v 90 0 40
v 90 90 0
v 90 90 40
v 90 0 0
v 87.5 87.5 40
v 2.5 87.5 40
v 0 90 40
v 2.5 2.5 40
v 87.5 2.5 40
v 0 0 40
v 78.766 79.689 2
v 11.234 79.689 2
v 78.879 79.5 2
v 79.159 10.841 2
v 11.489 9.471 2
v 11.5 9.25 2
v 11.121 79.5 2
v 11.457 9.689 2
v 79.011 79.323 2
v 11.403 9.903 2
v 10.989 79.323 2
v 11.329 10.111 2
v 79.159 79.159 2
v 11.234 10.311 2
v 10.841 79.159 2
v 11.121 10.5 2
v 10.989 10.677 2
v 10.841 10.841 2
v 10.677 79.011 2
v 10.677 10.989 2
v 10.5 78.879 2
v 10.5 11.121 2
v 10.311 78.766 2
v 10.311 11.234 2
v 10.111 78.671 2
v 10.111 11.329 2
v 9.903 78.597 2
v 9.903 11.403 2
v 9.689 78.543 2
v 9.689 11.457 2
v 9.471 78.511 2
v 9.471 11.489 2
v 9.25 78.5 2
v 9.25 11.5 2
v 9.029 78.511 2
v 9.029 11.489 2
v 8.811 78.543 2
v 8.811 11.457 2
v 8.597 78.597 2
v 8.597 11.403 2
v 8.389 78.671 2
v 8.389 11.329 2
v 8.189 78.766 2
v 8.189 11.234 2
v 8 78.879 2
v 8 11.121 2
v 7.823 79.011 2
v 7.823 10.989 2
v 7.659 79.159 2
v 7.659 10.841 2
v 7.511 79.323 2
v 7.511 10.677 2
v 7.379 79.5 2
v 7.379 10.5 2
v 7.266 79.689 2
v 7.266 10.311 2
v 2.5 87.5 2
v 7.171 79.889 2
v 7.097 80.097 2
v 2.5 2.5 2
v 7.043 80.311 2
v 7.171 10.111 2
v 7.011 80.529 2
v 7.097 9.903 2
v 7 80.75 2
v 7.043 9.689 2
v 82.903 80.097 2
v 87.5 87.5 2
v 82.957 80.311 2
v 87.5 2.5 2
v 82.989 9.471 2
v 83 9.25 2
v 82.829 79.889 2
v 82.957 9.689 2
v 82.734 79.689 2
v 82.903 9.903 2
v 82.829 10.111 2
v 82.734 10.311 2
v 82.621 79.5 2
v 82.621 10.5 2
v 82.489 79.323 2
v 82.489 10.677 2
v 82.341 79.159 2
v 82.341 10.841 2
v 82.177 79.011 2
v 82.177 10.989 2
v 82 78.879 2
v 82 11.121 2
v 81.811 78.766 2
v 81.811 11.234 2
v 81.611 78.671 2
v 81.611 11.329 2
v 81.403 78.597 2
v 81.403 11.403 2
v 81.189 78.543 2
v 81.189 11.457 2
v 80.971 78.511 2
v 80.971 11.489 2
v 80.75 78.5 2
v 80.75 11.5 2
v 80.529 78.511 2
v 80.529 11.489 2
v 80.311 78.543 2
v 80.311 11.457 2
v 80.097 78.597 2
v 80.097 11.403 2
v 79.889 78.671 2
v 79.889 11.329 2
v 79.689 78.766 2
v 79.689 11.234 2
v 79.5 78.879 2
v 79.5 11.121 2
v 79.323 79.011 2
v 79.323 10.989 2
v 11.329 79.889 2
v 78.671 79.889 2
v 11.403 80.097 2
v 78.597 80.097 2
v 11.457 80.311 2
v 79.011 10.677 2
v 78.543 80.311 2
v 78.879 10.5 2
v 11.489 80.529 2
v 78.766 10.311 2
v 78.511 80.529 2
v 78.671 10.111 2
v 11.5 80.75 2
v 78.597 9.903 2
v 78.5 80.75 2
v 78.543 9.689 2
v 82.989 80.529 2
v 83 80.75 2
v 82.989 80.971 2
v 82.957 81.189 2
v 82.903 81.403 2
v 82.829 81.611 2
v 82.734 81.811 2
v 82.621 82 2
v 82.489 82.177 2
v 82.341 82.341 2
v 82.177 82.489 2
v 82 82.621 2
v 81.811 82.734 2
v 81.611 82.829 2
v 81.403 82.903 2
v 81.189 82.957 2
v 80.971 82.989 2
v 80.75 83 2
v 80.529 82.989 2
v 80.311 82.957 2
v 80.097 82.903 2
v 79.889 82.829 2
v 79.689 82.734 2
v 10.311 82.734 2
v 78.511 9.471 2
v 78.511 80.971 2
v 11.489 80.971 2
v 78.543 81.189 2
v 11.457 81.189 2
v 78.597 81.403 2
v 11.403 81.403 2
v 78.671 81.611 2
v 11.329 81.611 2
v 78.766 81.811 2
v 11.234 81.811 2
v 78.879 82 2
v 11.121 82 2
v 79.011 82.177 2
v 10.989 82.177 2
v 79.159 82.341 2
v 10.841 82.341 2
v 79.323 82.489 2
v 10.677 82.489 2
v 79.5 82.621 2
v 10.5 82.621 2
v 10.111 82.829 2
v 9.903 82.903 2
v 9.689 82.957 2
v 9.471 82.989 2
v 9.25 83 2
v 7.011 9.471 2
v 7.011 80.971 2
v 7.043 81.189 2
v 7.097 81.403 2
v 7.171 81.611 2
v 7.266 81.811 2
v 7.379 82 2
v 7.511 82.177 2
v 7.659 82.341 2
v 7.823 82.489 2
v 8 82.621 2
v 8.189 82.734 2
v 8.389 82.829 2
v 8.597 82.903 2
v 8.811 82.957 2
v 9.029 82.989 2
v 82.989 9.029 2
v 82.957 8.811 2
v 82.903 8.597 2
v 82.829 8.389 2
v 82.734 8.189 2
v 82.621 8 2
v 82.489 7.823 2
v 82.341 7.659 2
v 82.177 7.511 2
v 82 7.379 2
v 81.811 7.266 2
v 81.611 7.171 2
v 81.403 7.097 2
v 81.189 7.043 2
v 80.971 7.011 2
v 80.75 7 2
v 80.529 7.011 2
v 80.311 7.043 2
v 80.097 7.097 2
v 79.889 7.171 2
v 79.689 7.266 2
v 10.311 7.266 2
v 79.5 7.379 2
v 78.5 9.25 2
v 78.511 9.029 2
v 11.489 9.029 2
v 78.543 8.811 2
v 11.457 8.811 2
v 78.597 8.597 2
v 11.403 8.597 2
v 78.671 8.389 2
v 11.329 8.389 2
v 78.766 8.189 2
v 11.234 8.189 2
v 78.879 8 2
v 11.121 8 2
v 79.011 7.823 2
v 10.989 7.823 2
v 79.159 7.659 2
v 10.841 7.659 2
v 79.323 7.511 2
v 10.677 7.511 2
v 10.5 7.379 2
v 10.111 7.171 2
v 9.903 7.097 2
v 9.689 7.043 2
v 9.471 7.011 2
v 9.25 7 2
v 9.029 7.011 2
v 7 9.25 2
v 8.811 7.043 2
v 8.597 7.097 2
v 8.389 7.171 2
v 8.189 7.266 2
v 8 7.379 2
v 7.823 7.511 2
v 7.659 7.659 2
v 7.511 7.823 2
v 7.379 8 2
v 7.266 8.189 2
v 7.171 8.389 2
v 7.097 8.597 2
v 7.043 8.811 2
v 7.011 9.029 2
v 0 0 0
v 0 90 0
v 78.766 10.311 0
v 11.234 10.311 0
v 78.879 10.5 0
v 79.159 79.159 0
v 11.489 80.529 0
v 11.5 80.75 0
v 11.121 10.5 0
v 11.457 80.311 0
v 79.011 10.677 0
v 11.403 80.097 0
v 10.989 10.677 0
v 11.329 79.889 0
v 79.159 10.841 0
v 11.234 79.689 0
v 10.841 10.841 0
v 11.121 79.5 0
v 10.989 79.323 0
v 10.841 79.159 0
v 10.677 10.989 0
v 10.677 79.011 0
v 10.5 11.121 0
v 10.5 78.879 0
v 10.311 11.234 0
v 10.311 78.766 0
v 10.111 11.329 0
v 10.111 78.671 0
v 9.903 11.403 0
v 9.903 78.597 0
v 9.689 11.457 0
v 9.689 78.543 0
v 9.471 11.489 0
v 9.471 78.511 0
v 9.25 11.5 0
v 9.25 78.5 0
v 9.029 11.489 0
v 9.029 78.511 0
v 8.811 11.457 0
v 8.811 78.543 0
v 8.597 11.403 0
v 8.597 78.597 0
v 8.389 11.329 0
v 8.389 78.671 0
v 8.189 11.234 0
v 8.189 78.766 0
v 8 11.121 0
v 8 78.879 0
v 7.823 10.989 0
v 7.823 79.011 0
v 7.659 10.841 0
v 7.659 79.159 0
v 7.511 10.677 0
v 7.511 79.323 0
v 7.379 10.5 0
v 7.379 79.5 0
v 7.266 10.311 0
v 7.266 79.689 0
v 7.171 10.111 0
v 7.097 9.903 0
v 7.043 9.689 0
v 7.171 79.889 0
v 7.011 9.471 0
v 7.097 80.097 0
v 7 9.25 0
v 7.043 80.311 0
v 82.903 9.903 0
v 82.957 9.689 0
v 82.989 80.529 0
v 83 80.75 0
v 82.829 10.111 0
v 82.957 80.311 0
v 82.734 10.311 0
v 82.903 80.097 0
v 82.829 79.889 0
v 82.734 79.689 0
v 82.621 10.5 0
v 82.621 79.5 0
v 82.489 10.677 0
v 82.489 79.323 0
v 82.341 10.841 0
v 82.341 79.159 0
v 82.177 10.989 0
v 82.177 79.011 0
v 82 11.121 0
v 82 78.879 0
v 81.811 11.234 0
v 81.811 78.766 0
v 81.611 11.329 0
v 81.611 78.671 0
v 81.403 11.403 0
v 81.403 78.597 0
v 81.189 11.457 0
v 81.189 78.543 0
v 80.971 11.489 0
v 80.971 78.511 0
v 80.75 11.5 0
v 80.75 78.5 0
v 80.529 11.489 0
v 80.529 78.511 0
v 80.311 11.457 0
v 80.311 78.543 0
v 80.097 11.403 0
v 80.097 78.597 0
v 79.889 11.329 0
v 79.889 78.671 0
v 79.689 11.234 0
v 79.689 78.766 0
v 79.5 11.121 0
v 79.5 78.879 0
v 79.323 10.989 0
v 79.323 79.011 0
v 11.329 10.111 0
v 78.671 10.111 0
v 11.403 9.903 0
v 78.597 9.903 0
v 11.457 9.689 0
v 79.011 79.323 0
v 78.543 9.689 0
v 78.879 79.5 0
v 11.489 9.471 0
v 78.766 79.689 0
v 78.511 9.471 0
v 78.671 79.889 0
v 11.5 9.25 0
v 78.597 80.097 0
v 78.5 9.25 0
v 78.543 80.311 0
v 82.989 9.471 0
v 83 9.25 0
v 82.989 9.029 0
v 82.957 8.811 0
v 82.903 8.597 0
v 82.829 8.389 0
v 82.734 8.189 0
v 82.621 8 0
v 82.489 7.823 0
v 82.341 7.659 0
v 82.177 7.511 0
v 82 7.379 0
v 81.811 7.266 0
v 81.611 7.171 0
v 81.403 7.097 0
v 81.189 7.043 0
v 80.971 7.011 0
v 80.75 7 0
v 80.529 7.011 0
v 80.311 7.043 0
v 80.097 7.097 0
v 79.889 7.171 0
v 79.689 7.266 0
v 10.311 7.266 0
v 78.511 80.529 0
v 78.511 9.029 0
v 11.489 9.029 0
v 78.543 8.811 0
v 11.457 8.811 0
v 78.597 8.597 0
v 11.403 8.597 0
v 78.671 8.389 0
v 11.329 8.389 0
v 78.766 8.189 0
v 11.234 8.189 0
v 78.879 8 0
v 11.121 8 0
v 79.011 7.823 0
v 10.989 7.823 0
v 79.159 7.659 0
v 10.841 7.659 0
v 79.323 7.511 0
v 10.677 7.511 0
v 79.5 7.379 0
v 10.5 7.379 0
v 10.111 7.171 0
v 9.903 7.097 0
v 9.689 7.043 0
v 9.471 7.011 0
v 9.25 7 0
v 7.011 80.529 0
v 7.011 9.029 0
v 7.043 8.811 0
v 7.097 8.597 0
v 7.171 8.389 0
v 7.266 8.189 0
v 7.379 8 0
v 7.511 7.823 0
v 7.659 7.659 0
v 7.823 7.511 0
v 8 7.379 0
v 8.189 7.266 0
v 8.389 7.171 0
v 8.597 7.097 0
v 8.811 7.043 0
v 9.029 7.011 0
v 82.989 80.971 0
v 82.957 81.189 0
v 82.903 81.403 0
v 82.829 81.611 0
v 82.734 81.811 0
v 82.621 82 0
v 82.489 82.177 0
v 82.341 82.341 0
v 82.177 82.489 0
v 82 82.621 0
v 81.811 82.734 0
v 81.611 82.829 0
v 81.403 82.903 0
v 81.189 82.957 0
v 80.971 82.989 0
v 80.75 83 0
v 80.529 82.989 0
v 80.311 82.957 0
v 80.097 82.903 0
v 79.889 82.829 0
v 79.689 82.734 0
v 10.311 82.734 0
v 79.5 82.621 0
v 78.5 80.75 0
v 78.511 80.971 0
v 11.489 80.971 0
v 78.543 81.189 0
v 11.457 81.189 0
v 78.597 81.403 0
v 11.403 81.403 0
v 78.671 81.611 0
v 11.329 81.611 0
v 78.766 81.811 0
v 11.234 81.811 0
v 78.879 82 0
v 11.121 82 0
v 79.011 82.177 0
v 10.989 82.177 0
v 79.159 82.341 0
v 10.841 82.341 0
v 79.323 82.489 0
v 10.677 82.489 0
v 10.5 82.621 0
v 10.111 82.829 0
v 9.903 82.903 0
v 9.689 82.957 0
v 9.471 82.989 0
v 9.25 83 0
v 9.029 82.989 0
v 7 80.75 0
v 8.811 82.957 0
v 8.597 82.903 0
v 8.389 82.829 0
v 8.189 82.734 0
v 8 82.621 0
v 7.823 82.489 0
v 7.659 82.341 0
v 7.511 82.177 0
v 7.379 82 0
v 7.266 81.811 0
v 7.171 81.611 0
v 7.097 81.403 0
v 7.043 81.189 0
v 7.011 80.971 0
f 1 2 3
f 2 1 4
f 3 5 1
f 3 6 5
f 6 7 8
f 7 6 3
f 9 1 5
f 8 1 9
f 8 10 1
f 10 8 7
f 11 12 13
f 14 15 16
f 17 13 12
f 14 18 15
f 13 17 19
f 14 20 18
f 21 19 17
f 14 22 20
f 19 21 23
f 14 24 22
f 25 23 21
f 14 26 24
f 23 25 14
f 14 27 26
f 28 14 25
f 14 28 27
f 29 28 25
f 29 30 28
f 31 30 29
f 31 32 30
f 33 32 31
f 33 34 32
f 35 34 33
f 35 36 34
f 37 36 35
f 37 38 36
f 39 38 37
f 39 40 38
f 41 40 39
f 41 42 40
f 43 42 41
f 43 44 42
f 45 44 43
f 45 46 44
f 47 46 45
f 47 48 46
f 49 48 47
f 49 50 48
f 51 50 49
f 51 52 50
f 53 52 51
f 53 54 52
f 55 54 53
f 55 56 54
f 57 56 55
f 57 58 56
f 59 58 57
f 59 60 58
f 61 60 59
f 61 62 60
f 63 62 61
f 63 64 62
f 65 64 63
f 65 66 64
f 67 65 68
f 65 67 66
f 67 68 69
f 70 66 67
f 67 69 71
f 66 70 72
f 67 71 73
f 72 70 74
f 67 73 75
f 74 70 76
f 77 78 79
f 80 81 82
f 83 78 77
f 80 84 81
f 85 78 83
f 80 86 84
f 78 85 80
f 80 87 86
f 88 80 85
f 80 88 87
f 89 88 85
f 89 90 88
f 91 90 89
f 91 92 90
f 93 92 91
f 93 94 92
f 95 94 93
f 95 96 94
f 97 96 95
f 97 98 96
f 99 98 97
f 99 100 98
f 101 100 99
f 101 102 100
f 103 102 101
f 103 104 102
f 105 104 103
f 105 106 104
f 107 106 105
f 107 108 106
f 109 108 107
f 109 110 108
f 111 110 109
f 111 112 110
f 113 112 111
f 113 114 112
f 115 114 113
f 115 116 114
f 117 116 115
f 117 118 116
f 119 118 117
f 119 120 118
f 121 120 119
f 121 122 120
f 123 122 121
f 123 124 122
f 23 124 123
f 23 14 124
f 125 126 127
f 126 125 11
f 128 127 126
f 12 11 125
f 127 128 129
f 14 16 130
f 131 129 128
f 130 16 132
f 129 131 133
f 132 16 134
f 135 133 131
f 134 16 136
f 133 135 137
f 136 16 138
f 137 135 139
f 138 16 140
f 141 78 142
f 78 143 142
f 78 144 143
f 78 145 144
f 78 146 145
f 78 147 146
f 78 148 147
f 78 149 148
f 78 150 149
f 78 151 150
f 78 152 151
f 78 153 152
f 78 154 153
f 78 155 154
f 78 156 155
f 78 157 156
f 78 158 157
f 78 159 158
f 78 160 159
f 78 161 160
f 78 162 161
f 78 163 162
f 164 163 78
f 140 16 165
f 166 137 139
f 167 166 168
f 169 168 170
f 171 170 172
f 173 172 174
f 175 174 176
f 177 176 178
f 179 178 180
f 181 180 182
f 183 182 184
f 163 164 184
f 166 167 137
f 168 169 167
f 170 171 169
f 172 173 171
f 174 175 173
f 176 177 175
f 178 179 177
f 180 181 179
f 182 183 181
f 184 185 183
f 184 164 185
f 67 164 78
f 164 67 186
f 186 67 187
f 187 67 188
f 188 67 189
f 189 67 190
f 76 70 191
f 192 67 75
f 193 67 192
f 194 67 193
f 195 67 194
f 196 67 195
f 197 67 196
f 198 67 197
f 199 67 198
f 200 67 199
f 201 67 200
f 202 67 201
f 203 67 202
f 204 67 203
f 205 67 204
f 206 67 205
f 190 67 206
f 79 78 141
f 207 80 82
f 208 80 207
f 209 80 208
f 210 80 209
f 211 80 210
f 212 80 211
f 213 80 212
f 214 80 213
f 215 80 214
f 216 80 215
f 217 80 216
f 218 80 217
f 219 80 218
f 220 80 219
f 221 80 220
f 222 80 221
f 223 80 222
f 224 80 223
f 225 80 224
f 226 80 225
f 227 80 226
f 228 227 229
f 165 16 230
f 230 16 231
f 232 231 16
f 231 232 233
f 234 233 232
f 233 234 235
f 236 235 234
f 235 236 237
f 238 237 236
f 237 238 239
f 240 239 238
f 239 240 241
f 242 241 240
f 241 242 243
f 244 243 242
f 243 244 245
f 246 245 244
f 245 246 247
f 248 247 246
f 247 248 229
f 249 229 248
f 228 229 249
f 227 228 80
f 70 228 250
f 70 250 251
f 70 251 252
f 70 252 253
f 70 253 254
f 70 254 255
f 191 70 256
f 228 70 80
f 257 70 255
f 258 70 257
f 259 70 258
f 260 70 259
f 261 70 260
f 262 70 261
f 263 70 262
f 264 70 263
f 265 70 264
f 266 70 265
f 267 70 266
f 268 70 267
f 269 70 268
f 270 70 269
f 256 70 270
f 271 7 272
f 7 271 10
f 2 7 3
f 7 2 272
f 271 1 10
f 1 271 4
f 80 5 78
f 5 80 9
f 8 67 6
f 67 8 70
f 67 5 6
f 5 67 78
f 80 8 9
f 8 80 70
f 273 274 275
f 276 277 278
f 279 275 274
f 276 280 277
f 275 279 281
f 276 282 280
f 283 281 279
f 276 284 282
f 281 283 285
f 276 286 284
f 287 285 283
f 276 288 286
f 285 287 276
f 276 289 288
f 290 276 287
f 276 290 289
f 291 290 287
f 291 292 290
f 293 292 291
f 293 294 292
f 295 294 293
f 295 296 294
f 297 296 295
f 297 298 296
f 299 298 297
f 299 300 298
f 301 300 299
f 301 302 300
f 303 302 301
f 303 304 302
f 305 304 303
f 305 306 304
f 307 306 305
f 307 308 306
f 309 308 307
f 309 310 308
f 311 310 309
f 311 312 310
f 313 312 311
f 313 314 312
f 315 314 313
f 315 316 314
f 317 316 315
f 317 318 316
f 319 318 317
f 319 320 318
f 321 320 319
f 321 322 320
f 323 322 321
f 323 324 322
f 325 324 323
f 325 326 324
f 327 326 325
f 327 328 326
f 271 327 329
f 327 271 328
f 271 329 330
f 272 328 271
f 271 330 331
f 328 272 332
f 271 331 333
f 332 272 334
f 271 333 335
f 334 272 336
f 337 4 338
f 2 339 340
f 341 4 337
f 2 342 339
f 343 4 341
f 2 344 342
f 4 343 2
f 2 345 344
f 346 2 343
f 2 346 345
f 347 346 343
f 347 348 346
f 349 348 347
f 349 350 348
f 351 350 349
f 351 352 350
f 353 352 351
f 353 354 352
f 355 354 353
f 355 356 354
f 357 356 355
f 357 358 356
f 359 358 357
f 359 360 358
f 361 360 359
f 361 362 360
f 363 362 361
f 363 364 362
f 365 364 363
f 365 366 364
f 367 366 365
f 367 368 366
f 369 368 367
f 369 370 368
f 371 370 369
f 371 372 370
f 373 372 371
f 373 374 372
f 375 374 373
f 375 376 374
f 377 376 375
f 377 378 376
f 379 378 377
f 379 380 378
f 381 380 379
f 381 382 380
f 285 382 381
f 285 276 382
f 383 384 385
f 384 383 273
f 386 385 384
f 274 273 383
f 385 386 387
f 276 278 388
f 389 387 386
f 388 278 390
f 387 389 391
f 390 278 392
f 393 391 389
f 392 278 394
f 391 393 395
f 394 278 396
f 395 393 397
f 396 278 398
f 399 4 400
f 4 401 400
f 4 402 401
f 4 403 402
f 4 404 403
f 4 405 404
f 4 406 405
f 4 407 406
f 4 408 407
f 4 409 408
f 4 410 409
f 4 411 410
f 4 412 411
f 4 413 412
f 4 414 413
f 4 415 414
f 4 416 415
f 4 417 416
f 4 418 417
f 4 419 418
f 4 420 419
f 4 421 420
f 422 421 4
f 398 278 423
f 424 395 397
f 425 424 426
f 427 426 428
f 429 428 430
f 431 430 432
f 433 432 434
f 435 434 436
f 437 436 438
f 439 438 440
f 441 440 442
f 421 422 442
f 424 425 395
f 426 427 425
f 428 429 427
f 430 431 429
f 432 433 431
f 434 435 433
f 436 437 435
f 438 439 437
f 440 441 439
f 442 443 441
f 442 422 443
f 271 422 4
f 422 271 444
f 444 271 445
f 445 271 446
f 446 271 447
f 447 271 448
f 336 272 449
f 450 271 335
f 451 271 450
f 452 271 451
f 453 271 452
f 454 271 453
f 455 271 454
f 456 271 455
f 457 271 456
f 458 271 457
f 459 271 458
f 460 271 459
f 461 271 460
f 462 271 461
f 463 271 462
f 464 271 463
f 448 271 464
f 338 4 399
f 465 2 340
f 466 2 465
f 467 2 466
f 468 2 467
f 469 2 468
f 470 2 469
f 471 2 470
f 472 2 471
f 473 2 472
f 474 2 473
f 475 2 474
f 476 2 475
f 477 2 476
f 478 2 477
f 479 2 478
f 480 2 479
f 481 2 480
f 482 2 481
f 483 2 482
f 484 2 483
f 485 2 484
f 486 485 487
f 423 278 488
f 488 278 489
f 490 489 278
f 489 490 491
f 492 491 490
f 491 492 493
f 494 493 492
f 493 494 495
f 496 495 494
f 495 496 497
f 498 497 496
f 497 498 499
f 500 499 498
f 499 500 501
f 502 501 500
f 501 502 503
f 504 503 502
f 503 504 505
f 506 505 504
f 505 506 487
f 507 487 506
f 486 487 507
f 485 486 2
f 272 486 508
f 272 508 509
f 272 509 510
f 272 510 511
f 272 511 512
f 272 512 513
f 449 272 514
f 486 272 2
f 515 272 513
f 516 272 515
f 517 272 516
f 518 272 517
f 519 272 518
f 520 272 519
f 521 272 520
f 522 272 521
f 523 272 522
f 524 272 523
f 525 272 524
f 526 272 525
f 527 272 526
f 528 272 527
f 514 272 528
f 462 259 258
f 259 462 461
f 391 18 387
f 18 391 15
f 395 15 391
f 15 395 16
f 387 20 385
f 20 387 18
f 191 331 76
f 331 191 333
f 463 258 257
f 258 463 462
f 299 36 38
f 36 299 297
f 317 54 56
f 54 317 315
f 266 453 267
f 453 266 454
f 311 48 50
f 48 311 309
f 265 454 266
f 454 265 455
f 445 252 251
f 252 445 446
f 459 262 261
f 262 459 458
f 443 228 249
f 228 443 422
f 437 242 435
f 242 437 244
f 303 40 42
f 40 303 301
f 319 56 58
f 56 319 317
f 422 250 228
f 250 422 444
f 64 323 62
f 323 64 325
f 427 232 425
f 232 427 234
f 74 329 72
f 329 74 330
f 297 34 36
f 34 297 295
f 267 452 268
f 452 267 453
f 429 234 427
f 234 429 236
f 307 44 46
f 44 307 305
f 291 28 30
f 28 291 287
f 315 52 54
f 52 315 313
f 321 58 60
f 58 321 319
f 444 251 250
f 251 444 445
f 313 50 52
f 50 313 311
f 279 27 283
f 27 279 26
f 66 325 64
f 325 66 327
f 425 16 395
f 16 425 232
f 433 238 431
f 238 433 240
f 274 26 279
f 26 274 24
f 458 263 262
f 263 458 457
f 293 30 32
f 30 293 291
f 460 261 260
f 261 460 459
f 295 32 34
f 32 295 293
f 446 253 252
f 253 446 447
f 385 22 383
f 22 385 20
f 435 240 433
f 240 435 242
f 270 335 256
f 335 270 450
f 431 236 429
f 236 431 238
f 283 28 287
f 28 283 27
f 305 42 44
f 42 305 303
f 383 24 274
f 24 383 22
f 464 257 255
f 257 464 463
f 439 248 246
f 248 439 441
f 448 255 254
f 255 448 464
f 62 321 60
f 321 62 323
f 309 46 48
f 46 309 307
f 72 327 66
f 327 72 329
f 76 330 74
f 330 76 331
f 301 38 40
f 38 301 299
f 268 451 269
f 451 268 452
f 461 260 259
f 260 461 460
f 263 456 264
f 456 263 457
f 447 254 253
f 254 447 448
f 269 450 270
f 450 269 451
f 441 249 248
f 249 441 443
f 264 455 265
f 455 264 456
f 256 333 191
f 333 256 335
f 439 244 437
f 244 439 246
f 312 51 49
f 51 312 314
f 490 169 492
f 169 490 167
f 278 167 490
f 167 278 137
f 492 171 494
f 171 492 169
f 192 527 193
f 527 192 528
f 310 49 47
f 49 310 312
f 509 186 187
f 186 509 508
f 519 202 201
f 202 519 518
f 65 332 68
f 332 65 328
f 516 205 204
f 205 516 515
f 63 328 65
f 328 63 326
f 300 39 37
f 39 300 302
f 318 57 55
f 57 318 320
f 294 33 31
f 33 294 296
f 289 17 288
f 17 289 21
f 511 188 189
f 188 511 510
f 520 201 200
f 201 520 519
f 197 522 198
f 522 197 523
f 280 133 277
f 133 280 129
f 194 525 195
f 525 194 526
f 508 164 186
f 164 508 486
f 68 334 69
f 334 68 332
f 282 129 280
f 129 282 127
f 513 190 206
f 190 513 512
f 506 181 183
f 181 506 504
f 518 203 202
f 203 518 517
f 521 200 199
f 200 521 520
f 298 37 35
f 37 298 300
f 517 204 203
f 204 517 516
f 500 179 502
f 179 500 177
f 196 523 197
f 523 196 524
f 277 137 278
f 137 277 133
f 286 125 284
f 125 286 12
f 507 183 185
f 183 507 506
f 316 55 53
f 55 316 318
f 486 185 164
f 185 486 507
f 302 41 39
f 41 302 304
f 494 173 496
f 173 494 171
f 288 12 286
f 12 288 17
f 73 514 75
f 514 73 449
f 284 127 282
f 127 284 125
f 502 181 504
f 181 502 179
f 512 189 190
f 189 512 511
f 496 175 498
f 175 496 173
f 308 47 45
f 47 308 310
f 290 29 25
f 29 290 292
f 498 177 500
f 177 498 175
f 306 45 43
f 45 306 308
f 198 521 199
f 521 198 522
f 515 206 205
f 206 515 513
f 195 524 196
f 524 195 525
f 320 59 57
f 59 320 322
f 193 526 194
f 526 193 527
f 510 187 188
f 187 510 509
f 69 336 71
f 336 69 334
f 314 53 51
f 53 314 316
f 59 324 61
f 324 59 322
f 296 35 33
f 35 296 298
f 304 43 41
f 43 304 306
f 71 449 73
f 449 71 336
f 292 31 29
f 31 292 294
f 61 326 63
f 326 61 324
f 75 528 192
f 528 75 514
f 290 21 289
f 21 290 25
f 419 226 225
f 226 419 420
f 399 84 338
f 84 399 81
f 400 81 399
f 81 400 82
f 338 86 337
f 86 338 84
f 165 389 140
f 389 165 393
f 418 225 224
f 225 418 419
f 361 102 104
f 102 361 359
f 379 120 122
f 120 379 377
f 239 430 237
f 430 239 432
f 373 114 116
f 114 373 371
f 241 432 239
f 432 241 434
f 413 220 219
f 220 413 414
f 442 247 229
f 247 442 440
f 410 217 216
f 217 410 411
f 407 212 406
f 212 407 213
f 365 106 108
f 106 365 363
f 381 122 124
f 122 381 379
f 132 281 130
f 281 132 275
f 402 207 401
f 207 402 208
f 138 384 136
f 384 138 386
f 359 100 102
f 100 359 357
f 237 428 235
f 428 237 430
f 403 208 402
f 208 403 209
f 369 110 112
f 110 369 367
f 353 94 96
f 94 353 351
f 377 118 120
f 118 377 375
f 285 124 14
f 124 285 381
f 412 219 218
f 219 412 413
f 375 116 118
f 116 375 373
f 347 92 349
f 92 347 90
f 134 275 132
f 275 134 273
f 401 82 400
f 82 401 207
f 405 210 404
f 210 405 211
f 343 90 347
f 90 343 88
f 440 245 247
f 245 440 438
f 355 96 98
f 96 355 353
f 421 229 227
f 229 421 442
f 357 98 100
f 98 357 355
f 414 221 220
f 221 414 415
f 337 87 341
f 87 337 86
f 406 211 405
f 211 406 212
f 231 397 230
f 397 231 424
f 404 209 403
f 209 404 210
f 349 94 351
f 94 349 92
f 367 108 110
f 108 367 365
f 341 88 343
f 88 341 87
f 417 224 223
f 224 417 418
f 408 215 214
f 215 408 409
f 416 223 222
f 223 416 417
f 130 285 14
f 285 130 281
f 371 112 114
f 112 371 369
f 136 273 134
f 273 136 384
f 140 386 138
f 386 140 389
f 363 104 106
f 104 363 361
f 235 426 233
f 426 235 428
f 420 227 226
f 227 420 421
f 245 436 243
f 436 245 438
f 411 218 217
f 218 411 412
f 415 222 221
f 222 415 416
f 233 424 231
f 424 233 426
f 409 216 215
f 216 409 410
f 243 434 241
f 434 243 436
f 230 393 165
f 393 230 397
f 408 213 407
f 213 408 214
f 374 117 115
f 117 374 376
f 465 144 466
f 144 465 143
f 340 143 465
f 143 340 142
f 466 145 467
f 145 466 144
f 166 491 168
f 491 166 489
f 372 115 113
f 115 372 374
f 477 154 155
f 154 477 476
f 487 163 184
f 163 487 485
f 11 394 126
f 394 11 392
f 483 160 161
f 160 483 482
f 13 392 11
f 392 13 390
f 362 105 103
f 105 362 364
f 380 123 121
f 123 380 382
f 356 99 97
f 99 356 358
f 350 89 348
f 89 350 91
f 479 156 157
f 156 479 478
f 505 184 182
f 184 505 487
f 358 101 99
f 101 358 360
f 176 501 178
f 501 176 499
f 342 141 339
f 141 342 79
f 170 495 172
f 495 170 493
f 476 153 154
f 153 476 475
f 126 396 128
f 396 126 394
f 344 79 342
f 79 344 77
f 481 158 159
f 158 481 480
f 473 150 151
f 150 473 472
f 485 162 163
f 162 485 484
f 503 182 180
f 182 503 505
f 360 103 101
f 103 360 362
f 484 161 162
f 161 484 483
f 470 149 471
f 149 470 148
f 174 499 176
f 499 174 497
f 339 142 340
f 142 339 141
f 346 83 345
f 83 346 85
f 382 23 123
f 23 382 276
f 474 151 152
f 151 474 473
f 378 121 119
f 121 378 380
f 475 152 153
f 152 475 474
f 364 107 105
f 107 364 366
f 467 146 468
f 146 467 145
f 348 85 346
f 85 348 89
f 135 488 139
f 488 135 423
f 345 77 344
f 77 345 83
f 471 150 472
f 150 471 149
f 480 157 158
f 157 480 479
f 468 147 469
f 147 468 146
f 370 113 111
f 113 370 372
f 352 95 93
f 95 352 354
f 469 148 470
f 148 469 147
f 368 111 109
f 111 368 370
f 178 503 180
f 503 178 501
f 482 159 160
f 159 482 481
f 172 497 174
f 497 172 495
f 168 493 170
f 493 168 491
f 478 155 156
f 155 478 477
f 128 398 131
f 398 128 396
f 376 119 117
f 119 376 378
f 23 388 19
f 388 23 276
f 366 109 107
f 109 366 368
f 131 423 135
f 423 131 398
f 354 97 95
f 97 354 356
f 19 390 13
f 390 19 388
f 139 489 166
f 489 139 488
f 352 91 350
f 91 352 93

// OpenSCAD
// --- Dimensions (mm) ---
outer_width = 90;          // Outer width and length of the box
outer_depth = 90;          // Outer depth and length of the box
wall_thickness = 2.5;       // Thickness of the four side walls
top_plate_thickness = 2;    // Thickness of the top plate (resting on bed)
total_height = 40;          // Total height of the housing
screw_hole_diameter = 4.5;  // Diameter for M4 screw holes
screw_pattern_size = 71.5;  // Distance between screw holes (center to center)
notch_width = 12;           // Width of the cable notch
notch_depth = 8;            // Depth of the notch from the open top
$fn = 64;                   // Smoothness for holes and cylinders

// --- Implementation ---

// The model is printed upside down: 
// The top plate is at Z = 0 to Z = top_plate_thickness.
// The walls rise from the plate up to Z = total_height.

module housing() {
    difference() {
        // Main Body (The outer shell)
        union() {
            // The Top Plate (Base of the box when upright, on bed when printing)
            cube([outer_width, outer_depth, top_plate_thickness]);
            
            // The Four Walls
            // We use a single cube and subtract the interior to ensure 
            // the walls are exactly the specified thickness.
            translate([0, 0, top_plate_thickness])
            difference() {
                // Outer volume of the walls
                cube([outer_width, outer_depth, total_height - top_plate_thickness]);
                
                // Hollow out the inside
                // We subtract a cube that is smaller by 2 * wall_thickness
                // We extend the subtraction in Z to ensure the hollow reaches the top
                translate([wall_thickness, wall_thickness, -0.01])
                cube([outer_width - 2 * wall_thickness, outer_depth - 2 * wall_thickness, total_height]);
            }
        }

        // Screw Holes (M4)
        // Positioned on the top plate (Z=0 to Z=2).
        // Centered on the plate (45, 45).
        for (i = [-1, 1], j = [-1, 1]) {
            translate([
                (outer_width / 2) + (i * screw_pattern_size / 2), 
                (outer_depth / 2) + (j * screw_pattern_size / 2), 
                -0.01 // Cut through the bottom of the plate
            ])
            cylinder(h = top_plate_thickness + 0.02, d = screw_hole_diameter);
        }

        // Cable Notch
        // Located in one wall, centered along the wall, 
        // reaching 8mm down from the open edge (z = 32 to z = 40).
        // Since we are printing upside down, the "open edge" is at Z = 40.
        // The notch is cut from the top of the walls.
        // We use a slightly wider/deeper cut to ensure no zero-thickness faces.
        translate([
            (outer_width / 2) - wall_thickness, // Positioned at the edge of one wall
            (outer_depth / 2) - (notch_width / 2), 
            total_height - notch_depth // Starts at Z=32
        ])
        cube([wall_thickness + 0.1, notch_width, notch_depth + 0.1]);
    }
}

// Render the part
housing();
